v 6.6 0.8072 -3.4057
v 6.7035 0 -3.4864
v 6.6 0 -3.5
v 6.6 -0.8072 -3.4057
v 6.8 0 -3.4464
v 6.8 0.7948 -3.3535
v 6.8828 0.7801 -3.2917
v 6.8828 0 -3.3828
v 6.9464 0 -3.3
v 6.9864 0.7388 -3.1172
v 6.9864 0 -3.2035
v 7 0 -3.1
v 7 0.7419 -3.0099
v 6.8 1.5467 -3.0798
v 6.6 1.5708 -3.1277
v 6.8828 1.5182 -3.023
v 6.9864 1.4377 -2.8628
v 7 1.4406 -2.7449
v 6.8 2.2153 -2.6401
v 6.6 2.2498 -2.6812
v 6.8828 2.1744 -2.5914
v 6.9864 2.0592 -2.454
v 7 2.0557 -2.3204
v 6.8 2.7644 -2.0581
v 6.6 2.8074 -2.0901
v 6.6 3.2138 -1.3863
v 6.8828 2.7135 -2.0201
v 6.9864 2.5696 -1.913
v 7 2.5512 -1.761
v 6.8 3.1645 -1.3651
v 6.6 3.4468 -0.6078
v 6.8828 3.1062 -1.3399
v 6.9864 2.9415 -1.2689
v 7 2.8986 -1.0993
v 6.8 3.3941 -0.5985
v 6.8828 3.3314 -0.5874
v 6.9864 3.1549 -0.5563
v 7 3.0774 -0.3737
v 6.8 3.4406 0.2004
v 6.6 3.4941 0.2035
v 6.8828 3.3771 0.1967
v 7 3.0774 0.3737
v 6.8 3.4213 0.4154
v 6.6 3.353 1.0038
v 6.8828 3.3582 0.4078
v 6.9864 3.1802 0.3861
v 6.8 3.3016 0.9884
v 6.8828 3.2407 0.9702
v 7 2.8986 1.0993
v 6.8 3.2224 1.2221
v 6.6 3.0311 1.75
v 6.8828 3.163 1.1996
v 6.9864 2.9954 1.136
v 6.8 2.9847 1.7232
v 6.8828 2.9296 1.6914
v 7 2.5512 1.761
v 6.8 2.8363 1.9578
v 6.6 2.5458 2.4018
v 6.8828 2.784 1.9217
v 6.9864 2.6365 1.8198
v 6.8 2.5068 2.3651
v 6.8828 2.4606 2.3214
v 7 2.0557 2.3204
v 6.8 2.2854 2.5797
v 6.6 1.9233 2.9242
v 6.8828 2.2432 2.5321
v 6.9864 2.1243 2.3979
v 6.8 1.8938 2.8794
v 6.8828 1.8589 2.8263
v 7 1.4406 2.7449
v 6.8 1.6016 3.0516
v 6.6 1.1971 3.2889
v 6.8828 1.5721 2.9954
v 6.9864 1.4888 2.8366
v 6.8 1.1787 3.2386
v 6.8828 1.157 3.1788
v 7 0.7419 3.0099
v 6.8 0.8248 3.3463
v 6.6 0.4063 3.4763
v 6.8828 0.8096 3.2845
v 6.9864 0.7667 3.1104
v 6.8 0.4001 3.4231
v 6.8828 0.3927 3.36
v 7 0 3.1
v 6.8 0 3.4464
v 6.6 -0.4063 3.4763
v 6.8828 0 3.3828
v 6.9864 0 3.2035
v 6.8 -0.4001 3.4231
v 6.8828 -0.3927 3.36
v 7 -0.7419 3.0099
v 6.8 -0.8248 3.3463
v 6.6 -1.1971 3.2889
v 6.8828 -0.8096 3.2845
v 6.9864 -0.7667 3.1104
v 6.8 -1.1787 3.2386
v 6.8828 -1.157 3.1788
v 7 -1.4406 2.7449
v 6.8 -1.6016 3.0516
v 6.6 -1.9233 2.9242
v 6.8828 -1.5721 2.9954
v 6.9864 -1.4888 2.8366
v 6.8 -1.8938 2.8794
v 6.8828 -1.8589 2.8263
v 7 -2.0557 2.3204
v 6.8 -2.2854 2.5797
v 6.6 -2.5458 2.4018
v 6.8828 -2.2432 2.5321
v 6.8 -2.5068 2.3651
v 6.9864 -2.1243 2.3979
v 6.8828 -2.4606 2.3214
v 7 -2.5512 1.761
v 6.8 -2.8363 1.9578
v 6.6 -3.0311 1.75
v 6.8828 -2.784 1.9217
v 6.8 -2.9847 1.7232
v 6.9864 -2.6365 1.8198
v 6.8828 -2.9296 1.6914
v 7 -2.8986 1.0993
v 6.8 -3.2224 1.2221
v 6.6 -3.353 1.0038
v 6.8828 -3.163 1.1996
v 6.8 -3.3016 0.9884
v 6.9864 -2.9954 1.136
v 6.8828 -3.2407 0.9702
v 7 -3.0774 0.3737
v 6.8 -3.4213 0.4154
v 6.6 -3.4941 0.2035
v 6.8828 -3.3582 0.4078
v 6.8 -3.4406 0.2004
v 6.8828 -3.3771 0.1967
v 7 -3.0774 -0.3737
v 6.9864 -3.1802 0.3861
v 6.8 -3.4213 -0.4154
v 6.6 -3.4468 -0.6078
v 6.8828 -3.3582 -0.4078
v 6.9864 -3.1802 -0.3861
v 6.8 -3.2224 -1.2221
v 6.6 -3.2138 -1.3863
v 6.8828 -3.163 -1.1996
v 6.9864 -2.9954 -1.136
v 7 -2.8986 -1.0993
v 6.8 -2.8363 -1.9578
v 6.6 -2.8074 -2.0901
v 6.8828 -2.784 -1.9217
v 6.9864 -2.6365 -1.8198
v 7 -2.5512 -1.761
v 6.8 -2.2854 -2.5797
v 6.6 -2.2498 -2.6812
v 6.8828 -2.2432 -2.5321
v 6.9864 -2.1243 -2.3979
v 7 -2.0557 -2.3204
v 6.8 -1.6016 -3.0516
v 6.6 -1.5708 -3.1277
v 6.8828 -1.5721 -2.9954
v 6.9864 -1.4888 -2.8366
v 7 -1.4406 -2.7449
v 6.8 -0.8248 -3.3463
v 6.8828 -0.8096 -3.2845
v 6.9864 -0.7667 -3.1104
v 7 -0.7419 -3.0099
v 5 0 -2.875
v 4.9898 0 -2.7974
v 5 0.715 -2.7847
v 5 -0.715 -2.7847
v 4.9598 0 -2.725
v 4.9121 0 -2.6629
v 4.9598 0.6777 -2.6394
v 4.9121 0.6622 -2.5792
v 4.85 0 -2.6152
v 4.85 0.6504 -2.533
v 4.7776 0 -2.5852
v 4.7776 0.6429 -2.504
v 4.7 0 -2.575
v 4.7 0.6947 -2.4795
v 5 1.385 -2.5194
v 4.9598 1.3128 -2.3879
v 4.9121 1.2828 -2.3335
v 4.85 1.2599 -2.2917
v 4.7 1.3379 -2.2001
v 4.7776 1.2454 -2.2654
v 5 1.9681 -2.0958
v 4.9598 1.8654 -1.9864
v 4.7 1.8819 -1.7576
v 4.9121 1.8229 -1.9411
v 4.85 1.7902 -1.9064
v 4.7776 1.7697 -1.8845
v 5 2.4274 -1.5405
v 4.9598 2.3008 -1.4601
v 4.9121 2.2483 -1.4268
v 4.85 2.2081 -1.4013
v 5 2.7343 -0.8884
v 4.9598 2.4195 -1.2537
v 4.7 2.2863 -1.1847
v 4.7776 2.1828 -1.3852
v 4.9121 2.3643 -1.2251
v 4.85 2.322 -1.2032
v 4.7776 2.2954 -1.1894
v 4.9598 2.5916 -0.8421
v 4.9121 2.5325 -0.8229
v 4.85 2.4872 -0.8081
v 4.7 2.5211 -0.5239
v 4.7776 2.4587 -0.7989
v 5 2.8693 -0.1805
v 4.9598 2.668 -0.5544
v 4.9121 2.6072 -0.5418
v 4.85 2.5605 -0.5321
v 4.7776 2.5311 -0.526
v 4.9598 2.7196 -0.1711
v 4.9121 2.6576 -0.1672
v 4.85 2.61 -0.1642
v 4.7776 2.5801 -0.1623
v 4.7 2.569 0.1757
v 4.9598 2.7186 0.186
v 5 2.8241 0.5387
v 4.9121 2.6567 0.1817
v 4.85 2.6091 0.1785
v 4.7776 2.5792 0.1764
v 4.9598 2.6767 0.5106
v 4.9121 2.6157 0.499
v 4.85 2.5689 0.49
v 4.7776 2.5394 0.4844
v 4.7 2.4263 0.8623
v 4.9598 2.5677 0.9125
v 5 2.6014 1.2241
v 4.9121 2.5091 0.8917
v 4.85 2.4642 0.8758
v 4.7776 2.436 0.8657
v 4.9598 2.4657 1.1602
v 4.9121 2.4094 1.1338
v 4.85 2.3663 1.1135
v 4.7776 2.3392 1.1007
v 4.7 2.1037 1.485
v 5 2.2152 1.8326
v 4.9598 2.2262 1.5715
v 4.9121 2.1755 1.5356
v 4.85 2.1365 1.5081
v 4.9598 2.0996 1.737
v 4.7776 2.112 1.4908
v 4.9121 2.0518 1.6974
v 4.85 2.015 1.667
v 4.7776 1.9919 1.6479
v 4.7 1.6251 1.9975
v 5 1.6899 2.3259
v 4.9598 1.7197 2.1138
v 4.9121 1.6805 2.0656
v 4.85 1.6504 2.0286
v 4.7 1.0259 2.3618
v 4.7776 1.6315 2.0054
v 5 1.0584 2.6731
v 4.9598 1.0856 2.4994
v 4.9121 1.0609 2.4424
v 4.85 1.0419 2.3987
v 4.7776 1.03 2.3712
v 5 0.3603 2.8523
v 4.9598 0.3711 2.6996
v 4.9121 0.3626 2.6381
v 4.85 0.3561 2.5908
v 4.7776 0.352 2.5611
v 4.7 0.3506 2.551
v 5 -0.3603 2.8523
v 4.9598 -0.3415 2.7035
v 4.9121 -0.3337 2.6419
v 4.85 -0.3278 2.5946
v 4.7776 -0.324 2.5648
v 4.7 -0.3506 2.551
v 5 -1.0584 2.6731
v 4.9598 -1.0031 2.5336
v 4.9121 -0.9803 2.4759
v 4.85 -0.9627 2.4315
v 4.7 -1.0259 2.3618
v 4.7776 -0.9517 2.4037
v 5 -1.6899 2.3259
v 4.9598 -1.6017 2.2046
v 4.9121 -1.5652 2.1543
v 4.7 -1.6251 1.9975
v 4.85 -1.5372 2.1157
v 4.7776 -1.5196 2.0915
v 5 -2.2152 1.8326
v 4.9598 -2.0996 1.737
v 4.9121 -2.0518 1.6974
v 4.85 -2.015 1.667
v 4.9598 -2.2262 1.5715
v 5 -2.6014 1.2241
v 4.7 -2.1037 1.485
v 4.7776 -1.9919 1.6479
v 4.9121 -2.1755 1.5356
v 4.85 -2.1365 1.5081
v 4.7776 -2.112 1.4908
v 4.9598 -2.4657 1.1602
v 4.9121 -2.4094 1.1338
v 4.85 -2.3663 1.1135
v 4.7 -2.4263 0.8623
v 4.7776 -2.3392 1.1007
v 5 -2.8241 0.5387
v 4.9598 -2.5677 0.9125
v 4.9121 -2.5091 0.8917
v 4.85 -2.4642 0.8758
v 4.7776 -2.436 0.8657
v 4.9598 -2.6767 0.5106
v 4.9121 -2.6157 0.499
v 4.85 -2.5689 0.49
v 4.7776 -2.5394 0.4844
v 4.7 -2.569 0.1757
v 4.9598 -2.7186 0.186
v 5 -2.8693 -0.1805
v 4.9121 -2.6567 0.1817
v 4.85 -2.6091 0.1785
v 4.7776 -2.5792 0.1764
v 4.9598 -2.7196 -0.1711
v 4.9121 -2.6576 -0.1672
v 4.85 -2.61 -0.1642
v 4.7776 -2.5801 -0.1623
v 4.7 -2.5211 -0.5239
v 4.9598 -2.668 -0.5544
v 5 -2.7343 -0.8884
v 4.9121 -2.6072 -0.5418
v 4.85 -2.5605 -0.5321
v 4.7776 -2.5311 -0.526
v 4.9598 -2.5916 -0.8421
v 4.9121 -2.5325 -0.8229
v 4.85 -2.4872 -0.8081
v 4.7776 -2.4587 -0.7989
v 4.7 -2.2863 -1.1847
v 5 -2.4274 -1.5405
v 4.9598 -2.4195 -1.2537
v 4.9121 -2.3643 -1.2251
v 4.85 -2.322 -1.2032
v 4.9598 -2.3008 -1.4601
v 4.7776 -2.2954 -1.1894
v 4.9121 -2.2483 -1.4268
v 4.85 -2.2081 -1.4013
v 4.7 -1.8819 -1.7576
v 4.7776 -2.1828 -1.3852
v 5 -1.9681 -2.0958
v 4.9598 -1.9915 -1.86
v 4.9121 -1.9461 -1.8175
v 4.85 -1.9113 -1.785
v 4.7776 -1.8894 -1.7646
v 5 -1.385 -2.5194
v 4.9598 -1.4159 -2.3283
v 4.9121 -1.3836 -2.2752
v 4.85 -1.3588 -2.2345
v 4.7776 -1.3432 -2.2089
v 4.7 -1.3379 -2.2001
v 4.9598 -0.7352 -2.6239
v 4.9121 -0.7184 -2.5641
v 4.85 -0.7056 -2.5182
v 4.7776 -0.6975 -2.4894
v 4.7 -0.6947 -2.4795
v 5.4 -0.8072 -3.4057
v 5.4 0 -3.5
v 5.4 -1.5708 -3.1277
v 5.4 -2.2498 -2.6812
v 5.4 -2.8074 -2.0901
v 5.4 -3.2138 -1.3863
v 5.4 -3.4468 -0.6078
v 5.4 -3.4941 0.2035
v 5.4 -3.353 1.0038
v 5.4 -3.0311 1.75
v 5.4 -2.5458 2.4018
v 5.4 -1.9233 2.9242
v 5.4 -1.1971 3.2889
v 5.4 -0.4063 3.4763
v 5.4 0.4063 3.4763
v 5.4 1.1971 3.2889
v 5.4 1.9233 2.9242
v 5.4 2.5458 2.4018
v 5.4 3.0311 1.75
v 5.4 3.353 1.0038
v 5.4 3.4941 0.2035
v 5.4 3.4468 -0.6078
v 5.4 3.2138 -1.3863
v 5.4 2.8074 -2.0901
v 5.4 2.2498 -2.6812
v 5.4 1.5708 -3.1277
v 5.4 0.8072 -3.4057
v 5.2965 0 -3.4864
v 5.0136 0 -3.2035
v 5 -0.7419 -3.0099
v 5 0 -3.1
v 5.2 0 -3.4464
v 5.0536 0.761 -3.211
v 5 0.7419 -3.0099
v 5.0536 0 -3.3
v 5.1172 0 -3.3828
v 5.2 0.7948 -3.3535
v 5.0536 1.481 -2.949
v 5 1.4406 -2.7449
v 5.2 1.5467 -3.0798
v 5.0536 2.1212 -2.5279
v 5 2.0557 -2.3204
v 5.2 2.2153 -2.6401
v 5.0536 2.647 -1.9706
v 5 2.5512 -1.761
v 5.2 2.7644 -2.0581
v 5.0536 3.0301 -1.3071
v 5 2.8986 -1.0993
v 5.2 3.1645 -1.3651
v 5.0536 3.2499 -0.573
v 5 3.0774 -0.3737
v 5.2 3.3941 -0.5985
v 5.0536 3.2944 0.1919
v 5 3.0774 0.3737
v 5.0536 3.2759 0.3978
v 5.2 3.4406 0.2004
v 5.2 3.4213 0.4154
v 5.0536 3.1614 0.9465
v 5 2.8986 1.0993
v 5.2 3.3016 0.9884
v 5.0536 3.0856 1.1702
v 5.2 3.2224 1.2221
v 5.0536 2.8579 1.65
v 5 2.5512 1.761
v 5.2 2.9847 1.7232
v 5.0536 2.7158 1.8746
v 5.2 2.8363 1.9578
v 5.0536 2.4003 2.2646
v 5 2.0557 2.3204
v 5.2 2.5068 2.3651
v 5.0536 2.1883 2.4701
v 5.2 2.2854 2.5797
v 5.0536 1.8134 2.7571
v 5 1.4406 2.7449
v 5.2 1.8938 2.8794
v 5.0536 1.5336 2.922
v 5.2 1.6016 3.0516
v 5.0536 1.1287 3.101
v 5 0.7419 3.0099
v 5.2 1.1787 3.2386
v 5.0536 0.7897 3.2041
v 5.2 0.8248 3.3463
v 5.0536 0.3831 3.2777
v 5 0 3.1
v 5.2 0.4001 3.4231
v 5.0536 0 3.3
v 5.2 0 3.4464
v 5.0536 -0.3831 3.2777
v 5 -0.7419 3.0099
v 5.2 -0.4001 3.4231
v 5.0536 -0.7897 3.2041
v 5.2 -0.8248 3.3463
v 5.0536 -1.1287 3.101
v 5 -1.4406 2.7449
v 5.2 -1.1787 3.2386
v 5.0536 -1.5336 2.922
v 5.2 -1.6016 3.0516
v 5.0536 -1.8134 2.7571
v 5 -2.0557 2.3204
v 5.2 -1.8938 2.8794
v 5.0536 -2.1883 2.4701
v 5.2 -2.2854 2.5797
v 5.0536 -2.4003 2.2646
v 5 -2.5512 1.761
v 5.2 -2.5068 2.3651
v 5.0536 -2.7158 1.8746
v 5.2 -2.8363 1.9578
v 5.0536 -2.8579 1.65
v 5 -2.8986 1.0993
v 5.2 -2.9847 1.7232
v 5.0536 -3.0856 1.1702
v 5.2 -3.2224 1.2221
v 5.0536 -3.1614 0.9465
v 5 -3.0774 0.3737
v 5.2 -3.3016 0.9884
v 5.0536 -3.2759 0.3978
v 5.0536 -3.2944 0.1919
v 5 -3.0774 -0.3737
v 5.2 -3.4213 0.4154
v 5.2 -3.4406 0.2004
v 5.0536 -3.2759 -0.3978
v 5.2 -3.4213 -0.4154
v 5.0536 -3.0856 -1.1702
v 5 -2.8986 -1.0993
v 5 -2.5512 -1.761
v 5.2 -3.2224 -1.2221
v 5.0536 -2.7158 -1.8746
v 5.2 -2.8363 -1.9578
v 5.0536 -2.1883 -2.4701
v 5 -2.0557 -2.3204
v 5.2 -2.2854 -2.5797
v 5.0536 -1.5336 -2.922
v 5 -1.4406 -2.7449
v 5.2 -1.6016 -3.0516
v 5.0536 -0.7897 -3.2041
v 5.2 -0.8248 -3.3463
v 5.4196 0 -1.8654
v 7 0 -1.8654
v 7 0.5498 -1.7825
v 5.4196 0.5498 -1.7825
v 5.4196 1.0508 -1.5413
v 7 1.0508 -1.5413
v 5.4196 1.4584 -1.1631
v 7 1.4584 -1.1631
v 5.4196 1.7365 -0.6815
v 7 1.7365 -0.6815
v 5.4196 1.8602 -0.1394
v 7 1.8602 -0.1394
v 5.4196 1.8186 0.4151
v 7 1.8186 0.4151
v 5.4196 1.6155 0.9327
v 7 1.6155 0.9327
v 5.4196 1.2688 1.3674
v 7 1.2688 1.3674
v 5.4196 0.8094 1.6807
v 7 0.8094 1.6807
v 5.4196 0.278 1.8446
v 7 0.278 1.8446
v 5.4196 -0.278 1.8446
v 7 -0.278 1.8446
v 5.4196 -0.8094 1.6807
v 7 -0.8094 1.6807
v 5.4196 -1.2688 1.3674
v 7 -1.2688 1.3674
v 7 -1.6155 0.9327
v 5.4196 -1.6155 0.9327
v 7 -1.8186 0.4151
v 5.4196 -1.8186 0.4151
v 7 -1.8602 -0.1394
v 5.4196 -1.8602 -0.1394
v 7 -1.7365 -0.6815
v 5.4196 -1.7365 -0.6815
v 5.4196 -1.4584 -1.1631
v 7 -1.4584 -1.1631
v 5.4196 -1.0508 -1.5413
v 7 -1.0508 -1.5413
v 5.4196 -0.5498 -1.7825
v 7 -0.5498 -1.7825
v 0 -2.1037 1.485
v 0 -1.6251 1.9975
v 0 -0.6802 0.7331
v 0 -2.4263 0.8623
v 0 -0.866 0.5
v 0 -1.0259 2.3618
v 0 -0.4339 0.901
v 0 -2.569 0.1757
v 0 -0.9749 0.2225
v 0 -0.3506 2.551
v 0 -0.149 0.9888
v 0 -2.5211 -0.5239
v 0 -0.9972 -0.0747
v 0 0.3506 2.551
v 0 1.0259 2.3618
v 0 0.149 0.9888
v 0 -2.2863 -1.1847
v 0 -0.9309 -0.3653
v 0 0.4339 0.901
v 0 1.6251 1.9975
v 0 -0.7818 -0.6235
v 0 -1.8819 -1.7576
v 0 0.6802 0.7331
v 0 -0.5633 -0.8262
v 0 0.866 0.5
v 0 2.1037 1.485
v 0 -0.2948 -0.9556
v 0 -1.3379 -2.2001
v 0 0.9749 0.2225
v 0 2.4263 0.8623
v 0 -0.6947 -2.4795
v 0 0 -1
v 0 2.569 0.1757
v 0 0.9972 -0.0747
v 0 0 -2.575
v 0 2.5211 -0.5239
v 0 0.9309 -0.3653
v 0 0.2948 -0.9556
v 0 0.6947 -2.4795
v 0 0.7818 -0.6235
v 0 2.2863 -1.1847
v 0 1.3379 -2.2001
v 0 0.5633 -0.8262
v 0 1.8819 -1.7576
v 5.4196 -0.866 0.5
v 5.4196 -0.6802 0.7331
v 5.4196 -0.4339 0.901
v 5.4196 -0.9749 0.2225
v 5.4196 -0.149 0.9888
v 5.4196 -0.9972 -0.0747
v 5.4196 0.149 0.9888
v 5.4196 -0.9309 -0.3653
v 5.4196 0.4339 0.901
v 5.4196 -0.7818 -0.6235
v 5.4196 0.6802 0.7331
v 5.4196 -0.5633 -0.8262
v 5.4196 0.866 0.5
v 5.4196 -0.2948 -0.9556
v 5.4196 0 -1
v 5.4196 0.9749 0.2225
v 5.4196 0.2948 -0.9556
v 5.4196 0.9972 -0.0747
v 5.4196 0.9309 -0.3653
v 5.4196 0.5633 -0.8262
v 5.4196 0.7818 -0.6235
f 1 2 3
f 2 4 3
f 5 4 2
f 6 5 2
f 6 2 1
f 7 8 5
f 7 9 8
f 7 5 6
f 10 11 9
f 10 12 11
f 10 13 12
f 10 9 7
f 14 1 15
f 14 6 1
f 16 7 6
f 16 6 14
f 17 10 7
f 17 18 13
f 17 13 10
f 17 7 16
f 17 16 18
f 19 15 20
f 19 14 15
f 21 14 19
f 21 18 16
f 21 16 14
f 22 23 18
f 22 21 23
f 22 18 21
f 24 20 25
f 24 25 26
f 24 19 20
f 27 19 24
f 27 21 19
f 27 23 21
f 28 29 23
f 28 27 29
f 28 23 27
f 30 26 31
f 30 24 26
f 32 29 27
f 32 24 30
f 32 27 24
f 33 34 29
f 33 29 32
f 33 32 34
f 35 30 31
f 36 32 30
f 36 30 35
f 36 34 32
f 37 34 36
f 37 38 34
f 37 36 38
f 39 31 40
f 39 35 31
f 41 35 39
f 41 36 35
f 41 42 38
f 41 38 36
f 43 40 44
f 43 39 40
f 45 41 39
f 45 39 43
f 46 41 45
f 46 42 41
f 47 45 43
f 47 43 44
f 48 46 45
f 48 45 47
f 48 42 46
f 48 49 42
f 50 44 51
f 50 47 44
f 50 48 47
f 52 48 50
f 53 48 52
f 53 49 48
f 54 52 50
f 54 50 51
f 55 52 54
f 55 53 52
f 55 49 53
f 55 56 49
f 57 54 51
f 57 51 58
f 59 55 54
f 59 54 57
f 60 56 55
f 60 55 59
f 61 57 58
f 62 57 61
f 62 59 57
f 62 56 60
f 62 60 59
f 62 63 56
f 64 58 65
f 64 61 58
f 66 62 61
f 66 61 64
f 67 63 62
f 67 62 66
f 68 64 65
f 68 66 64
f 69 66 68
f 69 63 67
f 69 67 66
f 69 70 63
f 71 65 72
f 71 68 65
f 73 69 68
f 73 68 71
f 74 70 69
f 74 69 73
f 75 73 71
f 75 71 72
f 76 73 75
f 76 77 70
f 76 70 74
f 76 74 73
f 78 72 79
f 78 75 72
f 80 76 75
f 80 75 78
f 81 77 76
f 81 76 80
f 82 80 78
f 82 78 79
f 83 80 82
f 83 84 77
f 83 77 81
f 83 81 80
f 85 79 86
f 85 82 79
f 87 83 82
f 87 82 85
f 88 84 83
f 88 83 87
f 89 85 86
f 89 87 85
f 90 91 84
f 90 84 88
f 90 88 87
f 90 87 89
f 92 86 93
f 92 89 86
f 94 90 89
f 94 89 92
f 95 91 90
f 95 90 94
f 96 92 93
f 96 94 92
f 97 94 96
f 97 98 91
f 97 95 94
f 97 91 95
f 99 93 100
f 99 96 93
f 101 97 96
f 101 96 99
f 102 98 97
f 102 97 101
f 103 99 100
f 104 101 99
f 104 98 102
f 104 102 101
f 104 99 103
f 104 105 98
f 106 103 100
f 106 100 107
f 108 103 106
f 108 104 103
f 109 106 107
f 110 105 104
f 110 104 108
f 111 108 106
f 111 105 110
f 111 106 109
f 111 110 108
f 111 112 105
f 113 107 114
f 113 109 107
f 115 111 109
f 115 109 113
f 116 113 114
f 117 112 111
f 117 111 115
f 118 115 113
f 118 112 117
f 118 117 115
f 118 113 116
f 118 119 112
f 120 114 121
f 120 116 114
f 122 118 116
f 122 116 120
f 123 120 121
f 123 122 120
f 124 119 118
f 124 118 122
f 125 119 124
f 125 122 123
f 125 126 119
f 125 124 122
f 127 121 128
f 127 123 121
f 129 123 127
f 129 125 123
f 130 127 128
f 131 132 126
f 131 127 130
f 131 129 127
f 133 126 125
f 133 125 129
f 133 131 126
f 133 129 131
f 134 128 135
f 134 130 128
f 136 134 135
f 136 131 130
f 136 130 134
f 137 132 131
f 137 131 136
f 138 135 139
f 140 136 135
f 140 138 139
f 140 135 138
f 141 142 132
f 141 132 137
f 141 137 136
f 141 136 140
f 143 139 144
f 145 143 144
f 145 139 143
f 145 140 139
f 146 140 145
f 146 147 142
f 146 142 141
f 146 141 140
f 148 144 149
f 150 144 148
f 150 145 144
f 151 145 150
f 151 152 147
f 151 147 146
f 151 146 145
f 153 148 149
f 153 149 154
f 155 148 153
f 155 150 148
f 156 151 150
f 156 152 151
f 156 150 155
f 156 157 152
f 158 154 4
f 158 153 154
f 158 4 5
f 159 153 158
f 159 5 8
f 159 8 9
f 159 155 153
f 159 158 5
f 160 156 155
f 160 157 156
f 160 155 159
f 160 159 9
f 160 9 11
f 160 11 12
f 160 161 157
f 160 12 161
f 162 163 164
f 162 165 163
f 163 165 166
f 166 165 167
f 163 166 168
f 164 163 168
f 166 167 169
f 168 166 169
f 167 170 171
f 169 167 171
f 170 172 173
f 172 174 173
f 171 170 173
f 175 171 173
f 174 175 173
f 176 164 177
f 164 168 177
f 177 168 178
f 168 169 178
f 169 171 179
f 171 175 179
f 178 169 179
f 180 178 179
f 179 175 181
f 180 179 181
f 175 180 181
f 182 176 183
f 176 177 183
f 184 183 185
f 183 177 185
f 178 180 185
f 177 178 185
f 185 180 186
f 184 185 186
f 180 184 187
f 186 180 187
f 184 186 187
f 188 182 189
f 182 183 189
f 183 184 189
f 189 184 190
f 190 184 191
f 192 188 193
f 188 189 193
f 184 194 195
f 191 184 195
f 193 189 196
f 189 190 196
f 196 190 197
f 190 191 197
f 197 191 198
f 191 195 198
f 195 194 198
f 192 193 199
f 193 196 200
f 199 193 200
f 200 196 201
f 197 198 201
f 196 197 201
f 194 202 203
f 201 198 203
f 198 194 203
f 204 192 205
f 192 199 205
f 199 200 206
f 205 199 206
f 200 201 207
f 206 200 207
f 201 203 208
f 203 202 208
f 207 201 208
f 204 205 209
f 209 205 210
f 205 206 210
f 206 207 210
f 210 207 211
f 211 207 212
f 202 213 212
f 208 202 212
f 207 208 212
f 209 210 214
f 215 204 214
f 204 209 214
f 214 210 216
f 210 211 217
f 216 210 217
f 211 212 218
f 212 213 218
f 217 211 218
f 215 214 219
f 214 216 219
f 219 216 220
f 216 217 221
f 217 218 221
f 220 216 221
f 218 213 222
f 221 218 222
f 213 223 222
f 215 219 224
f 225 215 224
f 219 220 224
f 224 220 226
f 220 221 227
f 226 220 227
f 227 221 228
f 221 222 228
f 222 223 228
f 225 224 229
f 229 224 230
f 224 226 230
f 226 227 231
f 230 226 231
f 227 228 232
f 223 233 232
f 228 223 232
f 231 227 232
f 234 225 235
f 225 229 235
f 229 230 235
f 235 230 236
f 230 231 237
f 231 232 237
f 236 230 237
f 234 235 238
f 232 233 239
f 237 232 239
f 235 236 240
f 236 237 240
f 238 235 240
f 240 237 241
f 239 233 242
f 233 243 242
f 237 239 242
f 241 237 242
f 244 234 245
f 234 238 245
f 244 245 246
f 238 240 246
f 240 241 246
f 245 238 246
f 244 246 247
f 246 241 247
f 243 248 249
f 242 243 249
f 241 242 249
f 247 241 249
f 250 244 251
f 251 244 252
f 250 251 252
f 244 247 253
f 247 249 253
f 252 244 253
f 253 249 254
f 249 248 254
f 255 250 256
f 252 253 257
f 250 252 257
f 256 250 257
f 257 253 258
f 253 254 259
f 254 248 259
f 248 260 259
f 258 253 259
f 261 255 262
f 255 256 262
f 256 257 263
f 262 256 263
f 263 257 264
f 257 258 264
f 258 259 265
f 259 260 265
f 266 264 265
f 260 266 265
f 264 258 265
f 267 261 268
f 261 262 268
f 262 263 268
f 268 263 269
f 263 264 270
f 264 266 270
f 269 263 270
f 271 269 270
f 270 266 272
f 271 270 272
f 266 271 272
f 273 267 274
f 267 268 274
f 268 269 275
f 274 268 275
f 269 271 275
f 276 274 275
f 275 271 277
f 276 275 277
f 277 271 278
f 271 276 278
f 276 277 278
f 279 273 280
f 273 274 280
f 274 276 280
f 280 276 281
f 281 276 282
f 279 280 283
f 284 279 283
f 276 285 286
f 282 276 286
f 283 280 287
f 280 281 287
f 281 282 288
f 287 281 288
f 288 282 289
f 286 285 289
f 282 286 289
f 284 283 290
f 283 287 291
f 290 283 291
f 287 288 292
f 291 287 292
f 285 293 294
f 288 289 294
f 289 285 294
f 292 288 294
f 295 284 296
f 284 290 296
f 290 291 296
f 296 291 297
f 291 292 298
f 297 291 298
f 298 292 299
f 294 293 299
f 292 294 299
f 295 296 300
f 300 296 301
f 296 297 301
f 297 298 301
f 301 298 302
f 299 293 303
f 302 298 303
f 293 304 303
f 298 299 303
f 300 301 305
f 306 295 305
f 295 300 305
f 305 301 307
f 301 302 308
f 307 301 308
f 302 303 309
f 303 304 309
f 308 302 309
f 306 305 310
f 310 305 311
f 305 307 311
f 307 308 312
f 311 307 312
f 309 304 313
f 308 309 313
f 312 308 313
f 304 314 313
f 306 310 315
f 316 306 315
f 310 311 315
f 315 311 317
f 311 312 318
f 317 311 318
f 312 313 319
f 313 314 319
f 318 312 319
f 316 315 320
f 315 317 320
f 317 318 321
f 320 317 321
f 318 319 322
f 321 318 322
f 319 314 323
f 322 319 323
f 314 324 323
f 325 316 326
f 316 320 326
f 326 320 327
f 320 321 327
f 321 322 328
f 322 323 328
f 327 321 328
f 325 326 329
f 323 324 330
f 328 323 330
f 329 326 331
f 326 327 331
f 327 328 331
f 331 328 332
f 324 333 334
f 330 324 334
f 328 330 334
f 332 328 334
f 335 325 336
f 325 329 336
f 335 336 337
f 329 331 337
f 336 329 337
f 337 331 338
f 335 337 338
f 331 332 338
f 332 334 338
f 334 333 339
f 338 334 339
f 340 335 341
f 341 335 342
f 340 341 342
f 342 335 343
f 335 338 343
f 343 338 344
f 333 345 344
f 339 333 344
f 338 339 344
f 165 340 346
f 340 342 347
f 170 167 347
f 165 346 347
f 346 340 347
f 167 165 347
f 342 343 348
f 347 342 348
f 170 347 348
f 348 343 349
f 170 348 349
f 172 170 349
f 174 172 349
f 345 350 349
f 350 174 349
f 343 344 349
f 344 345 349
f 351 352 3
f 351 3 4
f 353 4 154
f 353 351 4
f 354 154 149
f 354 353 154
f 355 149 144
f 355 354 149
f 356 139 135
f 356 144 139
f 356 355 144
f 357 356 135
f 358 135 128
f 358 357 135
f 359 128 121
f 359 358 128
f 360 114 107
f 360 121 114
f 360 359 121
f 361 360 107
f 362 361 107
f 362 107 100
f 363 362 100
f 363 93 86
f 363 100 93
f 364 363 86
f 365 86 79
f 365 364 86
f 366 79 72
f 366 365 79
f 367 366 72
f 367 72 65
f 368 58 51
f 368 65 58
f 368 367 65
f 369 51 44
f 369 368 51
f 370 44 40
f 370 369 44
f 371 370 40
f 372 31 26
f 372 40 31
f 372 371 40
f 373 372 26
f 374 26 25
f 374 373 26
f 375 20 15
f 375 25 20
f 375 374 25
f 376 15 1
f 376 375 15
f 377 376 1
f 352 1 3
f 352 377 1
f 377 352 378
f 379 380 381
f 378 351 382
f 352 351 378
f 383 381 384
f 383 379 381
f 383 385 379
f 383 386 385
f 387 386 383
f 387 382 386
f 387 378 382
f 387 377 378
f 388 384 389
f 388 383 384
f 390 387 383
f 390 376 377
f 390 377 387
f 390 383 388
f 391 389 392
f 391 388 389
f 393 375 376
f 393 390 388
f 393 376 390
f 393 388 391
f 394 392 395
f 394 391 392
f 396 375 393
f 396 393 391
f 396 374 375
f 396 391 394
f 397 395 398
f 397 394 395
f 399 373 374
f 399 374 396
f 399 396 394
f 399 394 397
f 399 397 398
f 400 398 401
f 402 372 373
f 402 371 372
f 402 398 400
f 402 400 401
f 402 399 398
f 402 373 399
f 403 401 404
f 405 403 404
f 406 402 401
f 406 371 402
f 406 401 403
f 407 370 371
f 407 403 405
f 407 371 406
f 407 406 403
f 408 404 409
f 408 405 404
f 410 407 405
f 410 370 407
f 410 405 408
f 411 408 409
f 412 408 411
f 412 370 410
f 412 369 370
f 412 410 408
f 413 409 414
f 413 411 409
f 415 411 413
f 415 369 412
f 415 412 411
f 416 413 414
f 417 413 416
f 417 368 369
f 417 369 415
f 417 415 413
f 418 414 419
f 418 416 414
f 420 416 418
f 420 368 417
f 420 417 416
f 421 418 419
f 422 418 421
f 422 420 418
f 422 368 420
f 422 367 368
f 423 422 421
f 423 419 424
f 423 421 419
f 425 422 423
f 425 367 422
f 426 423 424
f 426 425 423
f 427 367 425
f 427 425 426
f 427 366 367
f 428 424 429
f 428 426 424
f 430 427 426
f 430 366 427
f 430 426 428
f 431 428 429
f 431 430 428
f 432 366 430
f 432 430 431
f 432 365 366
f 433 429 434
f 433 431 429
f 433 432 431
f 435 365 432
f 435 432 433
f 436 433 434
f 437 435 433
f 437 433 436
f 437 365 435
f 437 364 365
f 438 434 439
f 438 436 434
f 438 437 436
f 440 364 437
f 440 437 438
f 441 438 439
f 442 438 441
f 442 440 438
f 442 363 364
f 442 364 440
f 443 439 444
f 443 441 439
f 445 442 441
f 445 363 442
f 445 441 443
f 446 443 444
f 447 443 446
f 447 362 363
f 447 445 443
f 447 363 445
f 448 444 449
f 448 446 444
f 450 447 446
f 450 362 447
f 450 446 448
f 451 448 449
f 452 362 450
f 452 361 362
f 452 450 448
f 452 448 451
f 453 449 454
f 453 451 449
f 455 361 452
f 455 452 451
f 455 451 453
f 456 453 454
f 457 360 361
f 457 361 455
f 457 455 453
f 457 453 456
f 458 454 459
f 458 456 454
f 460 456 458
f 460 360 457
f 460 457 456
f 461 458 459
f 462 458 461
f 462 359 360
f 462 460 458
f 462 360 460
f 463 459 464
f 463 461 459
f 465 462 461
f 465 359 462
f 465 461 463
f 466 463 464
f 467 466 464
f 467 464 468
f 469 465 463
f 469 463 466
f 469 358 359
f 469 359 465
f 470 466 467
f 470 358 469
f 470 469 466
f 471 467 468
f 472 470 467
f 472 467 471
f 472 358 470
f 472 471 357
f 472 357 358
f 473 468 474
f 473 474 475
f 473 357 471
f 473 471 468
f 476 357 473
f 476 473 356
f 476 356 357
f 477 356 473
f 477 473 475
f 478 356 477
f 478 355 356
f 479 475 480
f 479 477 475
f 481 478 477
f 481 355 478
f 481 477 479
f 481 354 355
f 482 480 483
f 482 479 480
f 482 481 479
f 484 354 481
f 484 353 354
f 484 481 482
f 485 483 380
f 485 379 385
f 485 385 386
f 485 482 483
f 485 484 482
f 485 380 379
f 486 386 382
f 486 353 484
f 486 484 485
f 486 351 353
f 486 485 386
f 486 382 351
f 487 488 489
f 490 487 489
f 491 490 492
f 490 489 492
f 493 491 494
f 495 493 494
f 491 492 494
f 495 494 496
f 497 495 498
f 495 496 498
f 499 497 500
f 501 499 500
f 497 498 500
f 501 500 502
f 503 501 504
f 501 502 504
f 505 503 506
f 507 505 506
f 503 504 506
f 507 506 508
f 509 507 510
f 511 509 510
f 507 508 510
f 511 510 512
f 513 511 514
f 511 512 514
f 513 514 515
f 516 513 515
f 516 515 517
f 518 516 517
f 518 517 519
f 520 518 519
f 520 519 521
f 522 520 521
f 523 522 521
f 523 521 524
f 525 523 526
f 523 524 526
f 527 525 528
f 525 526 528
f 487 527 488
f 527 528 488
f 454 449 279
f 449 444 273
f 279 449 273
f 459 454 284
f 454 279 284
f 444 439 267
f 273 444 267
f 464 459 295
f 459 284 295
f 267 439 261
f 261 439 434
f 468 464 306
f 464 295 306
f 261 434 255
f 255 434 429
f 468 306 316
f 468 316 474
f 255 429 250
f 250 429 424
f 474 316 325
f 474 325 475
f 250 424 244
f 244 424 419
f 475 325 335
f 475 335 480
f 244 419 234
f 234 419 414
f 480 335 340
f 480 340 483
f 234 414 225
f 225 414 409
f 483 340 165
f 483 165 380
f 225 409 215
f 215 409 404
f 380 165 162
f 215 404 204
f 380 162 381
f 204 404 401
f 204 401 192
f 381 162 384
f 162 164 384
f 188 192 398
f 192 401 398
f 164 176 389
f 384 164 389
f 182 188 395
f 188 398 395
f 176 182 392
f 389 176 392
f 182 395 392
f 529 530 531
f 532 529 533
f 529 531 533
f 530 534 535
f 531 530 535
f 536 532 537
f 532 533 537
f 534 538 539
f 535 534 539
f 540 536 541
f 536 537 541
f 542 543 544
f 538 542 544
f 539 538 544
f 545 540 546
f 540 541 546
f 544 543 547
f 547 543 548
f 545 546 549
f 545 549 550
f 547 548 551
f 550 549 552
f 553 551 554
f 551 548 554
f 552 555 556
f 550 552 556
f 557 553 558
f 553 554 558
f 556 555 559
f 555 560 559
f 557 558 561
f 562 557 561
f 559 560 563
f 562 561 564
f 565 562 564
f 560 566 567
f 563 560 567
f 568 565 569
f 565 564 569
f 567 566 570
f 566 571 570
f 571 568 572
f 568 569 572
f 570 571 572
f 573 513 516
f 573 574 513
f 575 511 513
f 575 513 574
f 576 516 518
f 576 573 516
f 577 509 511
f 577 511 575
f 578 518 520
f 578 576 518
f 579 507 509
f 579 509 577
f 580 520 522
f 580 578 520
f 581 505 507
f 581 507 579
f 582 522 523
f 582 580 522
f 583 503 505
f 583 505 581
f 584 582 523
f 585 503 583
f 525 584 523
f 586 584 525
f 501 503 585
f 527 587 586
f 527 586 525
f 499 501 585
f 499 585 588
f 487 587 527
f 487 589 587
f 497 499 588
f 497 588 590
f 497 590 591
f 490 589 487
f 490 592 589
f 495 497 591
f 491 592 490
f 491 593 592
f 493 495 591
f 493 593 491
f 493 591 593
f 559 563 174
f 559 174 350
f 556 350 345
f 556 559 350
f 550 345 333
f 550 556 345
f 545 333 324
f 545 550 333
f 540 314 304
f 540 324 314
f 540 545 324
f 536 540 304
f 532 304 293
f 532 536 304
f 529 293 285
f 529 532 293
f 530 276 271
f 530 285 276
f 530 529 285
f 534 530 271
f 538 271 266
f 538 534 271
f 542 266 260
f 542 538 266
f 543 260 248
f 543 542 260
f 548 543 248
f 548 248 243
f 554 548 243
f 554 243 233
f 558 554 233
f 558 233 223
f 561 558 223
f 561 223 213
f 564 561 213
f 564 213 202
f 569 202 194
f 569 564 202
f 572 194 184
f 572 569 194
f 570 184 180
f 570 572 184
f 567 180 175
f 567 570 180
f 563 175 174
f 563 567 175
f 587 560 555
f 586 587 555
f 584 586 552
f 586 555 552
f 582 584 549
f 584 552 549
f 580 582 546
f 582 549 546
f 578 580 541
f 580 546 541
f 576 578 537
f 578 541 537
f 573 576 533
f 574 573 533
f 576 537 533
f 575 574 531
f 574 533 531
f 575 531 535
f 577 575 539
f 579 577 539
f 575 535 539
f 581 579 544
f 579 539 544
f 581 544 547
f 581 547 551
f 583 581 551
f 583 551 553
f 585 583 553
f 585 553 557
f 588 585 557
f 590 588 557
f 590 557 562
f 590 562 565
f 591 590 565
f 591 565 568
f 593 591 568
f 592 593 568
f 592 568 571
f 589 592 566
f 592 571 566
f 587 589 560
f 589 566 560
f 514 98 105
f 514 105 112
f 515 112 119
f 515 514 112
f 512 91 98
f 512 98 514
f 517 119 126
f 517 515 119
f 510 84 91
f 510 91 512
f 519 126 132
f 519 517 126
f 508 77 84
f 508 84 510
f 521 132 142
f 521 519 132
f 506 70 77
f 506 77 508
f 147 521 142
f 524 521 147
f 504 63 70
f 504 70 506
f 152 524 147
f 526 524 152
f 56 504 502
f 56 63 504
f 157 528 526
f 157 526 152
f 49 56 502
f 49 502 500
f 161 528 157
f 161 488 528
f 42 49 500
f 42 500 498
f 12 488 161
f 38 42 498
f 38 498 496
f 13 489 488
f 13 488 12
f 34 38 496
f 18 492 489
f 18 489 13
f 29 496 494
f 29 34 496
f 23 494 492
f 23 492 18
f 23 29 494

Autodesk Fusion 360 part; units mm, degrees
sketch "Sketch1" plane through (0, 0, 0) normal (1, 0, 0) x (0, 0, -1)
  circle A0 centre (0, 0) radius 2.575
  dimension "d1" = 5.15
extrude "Extrude1" add sketch "Sketch1" along normal blind 5
sketch "Sketch2" plane through (5, 0, 0) normal (1, 0, 0) x (0, 0, -1)
  circle A0 centre (0, 0) radius 2.575
  circle A1 centre (0, 0) radius 3.5
  dimension "d4" = 7
extrude "Extrude2" add sketch "Sketch2" along normal blind 2 contours A0 | A1
sketch "Sketch3" plane through (0, 0, 0) normal (1, 0, 0) x (0, 0, -1)
  circle A0 centre (0, 0) radius 1
  dimension "d7" = 2
extrude "Extrude3" cut sketch "Sketch3" along normal up to surface (7 mm away)
sketch "Sketch4" plane through (7, 0, 0) normal (1, 0, 0) x (0, 0, -1)
  circle A0 centre (0, 0) radius 1
  circle A1 centre (0, 0) radius 3.5
  line L0 (2.02, -2.1816) -> (-2.02, -2.1816) construction
  line L1 (-2.02, -2.1816) -> (-2.02, 2.1816) construction
  line L2 (-2.02, 2.1816) -> (2.02, 2.1816) construction
  line L3 (2.02, 2.1816) -> (2.02, -2.1816) construction
  line L4 (2.02, -2.1816) -> (-2.02, 2.1816) construction
  line L5 (-2.02, -2.1816) -> (2.02, 2.1816) construction
  line L6 (-2.02, 0) -> (2.02, 0) construction
  line L7 (0, -2.1816) -> (0, 2.1816) construction
  line L8 (-2.02, 1.137) -> (-2.02, -1.137)
  line L9 (2.02, 1.137) -> (2.02, -1.137)
  line L10 (-2.02, 1.137) -> (0, 2.1816)
  line L11 (0, 2.1816) -> (2.02, 1.137)
  line L12 (2.02, -1.137) -> (0, -2.1816)
  line L13 (0, -2.1816) -> (-2.02, -1.137)
  circle A2 centre (0, 0) radius 1.8654
  dimension "d10" = 4.04
  dimension "d11" = 4.3632
  dimension "d22" = 3.7308
fillet "Fillet1" radius 0.3 1 edges at (5, -0.9312, 2.4007)
fillet "Fillet2" radius 0.4 2 edges at (5, -1.2657, 3.2631) (7, -1.2657, 3.2631)
extrude "Extrude6" cut sketch "Sketch4" against normal blind 1.5804 contours A0 | A2
sketch "Sketch5" plane through (0, 0, 0) normal (1, 0, 0) x (0, 0, -1)
  line L0 (-3.5, 0) -> (3.5, 0)
  line L1 (3.5, 0) -> (3.5, -3.5)
  line L2 (3.5, -3.5) -> (-3.5, -3.5)
  line L3 (-3.5, -3.5) -> (-3.5, 0)
  dimension "d18" = 7
  dimension "d19" = 3.5
extrude "Extrude5" [suppressed]
equation "d1 = 5 mm * 1.03"
equation "d10 = ( 4 * 1.01 ) * 1 mm"
equation "d11 = ( 4.32 * 1.01 ) * 1 mm"
equation "d22 = 0.144 in * 1.02"
equation "d23 = -0.061 * 1.02 in"
